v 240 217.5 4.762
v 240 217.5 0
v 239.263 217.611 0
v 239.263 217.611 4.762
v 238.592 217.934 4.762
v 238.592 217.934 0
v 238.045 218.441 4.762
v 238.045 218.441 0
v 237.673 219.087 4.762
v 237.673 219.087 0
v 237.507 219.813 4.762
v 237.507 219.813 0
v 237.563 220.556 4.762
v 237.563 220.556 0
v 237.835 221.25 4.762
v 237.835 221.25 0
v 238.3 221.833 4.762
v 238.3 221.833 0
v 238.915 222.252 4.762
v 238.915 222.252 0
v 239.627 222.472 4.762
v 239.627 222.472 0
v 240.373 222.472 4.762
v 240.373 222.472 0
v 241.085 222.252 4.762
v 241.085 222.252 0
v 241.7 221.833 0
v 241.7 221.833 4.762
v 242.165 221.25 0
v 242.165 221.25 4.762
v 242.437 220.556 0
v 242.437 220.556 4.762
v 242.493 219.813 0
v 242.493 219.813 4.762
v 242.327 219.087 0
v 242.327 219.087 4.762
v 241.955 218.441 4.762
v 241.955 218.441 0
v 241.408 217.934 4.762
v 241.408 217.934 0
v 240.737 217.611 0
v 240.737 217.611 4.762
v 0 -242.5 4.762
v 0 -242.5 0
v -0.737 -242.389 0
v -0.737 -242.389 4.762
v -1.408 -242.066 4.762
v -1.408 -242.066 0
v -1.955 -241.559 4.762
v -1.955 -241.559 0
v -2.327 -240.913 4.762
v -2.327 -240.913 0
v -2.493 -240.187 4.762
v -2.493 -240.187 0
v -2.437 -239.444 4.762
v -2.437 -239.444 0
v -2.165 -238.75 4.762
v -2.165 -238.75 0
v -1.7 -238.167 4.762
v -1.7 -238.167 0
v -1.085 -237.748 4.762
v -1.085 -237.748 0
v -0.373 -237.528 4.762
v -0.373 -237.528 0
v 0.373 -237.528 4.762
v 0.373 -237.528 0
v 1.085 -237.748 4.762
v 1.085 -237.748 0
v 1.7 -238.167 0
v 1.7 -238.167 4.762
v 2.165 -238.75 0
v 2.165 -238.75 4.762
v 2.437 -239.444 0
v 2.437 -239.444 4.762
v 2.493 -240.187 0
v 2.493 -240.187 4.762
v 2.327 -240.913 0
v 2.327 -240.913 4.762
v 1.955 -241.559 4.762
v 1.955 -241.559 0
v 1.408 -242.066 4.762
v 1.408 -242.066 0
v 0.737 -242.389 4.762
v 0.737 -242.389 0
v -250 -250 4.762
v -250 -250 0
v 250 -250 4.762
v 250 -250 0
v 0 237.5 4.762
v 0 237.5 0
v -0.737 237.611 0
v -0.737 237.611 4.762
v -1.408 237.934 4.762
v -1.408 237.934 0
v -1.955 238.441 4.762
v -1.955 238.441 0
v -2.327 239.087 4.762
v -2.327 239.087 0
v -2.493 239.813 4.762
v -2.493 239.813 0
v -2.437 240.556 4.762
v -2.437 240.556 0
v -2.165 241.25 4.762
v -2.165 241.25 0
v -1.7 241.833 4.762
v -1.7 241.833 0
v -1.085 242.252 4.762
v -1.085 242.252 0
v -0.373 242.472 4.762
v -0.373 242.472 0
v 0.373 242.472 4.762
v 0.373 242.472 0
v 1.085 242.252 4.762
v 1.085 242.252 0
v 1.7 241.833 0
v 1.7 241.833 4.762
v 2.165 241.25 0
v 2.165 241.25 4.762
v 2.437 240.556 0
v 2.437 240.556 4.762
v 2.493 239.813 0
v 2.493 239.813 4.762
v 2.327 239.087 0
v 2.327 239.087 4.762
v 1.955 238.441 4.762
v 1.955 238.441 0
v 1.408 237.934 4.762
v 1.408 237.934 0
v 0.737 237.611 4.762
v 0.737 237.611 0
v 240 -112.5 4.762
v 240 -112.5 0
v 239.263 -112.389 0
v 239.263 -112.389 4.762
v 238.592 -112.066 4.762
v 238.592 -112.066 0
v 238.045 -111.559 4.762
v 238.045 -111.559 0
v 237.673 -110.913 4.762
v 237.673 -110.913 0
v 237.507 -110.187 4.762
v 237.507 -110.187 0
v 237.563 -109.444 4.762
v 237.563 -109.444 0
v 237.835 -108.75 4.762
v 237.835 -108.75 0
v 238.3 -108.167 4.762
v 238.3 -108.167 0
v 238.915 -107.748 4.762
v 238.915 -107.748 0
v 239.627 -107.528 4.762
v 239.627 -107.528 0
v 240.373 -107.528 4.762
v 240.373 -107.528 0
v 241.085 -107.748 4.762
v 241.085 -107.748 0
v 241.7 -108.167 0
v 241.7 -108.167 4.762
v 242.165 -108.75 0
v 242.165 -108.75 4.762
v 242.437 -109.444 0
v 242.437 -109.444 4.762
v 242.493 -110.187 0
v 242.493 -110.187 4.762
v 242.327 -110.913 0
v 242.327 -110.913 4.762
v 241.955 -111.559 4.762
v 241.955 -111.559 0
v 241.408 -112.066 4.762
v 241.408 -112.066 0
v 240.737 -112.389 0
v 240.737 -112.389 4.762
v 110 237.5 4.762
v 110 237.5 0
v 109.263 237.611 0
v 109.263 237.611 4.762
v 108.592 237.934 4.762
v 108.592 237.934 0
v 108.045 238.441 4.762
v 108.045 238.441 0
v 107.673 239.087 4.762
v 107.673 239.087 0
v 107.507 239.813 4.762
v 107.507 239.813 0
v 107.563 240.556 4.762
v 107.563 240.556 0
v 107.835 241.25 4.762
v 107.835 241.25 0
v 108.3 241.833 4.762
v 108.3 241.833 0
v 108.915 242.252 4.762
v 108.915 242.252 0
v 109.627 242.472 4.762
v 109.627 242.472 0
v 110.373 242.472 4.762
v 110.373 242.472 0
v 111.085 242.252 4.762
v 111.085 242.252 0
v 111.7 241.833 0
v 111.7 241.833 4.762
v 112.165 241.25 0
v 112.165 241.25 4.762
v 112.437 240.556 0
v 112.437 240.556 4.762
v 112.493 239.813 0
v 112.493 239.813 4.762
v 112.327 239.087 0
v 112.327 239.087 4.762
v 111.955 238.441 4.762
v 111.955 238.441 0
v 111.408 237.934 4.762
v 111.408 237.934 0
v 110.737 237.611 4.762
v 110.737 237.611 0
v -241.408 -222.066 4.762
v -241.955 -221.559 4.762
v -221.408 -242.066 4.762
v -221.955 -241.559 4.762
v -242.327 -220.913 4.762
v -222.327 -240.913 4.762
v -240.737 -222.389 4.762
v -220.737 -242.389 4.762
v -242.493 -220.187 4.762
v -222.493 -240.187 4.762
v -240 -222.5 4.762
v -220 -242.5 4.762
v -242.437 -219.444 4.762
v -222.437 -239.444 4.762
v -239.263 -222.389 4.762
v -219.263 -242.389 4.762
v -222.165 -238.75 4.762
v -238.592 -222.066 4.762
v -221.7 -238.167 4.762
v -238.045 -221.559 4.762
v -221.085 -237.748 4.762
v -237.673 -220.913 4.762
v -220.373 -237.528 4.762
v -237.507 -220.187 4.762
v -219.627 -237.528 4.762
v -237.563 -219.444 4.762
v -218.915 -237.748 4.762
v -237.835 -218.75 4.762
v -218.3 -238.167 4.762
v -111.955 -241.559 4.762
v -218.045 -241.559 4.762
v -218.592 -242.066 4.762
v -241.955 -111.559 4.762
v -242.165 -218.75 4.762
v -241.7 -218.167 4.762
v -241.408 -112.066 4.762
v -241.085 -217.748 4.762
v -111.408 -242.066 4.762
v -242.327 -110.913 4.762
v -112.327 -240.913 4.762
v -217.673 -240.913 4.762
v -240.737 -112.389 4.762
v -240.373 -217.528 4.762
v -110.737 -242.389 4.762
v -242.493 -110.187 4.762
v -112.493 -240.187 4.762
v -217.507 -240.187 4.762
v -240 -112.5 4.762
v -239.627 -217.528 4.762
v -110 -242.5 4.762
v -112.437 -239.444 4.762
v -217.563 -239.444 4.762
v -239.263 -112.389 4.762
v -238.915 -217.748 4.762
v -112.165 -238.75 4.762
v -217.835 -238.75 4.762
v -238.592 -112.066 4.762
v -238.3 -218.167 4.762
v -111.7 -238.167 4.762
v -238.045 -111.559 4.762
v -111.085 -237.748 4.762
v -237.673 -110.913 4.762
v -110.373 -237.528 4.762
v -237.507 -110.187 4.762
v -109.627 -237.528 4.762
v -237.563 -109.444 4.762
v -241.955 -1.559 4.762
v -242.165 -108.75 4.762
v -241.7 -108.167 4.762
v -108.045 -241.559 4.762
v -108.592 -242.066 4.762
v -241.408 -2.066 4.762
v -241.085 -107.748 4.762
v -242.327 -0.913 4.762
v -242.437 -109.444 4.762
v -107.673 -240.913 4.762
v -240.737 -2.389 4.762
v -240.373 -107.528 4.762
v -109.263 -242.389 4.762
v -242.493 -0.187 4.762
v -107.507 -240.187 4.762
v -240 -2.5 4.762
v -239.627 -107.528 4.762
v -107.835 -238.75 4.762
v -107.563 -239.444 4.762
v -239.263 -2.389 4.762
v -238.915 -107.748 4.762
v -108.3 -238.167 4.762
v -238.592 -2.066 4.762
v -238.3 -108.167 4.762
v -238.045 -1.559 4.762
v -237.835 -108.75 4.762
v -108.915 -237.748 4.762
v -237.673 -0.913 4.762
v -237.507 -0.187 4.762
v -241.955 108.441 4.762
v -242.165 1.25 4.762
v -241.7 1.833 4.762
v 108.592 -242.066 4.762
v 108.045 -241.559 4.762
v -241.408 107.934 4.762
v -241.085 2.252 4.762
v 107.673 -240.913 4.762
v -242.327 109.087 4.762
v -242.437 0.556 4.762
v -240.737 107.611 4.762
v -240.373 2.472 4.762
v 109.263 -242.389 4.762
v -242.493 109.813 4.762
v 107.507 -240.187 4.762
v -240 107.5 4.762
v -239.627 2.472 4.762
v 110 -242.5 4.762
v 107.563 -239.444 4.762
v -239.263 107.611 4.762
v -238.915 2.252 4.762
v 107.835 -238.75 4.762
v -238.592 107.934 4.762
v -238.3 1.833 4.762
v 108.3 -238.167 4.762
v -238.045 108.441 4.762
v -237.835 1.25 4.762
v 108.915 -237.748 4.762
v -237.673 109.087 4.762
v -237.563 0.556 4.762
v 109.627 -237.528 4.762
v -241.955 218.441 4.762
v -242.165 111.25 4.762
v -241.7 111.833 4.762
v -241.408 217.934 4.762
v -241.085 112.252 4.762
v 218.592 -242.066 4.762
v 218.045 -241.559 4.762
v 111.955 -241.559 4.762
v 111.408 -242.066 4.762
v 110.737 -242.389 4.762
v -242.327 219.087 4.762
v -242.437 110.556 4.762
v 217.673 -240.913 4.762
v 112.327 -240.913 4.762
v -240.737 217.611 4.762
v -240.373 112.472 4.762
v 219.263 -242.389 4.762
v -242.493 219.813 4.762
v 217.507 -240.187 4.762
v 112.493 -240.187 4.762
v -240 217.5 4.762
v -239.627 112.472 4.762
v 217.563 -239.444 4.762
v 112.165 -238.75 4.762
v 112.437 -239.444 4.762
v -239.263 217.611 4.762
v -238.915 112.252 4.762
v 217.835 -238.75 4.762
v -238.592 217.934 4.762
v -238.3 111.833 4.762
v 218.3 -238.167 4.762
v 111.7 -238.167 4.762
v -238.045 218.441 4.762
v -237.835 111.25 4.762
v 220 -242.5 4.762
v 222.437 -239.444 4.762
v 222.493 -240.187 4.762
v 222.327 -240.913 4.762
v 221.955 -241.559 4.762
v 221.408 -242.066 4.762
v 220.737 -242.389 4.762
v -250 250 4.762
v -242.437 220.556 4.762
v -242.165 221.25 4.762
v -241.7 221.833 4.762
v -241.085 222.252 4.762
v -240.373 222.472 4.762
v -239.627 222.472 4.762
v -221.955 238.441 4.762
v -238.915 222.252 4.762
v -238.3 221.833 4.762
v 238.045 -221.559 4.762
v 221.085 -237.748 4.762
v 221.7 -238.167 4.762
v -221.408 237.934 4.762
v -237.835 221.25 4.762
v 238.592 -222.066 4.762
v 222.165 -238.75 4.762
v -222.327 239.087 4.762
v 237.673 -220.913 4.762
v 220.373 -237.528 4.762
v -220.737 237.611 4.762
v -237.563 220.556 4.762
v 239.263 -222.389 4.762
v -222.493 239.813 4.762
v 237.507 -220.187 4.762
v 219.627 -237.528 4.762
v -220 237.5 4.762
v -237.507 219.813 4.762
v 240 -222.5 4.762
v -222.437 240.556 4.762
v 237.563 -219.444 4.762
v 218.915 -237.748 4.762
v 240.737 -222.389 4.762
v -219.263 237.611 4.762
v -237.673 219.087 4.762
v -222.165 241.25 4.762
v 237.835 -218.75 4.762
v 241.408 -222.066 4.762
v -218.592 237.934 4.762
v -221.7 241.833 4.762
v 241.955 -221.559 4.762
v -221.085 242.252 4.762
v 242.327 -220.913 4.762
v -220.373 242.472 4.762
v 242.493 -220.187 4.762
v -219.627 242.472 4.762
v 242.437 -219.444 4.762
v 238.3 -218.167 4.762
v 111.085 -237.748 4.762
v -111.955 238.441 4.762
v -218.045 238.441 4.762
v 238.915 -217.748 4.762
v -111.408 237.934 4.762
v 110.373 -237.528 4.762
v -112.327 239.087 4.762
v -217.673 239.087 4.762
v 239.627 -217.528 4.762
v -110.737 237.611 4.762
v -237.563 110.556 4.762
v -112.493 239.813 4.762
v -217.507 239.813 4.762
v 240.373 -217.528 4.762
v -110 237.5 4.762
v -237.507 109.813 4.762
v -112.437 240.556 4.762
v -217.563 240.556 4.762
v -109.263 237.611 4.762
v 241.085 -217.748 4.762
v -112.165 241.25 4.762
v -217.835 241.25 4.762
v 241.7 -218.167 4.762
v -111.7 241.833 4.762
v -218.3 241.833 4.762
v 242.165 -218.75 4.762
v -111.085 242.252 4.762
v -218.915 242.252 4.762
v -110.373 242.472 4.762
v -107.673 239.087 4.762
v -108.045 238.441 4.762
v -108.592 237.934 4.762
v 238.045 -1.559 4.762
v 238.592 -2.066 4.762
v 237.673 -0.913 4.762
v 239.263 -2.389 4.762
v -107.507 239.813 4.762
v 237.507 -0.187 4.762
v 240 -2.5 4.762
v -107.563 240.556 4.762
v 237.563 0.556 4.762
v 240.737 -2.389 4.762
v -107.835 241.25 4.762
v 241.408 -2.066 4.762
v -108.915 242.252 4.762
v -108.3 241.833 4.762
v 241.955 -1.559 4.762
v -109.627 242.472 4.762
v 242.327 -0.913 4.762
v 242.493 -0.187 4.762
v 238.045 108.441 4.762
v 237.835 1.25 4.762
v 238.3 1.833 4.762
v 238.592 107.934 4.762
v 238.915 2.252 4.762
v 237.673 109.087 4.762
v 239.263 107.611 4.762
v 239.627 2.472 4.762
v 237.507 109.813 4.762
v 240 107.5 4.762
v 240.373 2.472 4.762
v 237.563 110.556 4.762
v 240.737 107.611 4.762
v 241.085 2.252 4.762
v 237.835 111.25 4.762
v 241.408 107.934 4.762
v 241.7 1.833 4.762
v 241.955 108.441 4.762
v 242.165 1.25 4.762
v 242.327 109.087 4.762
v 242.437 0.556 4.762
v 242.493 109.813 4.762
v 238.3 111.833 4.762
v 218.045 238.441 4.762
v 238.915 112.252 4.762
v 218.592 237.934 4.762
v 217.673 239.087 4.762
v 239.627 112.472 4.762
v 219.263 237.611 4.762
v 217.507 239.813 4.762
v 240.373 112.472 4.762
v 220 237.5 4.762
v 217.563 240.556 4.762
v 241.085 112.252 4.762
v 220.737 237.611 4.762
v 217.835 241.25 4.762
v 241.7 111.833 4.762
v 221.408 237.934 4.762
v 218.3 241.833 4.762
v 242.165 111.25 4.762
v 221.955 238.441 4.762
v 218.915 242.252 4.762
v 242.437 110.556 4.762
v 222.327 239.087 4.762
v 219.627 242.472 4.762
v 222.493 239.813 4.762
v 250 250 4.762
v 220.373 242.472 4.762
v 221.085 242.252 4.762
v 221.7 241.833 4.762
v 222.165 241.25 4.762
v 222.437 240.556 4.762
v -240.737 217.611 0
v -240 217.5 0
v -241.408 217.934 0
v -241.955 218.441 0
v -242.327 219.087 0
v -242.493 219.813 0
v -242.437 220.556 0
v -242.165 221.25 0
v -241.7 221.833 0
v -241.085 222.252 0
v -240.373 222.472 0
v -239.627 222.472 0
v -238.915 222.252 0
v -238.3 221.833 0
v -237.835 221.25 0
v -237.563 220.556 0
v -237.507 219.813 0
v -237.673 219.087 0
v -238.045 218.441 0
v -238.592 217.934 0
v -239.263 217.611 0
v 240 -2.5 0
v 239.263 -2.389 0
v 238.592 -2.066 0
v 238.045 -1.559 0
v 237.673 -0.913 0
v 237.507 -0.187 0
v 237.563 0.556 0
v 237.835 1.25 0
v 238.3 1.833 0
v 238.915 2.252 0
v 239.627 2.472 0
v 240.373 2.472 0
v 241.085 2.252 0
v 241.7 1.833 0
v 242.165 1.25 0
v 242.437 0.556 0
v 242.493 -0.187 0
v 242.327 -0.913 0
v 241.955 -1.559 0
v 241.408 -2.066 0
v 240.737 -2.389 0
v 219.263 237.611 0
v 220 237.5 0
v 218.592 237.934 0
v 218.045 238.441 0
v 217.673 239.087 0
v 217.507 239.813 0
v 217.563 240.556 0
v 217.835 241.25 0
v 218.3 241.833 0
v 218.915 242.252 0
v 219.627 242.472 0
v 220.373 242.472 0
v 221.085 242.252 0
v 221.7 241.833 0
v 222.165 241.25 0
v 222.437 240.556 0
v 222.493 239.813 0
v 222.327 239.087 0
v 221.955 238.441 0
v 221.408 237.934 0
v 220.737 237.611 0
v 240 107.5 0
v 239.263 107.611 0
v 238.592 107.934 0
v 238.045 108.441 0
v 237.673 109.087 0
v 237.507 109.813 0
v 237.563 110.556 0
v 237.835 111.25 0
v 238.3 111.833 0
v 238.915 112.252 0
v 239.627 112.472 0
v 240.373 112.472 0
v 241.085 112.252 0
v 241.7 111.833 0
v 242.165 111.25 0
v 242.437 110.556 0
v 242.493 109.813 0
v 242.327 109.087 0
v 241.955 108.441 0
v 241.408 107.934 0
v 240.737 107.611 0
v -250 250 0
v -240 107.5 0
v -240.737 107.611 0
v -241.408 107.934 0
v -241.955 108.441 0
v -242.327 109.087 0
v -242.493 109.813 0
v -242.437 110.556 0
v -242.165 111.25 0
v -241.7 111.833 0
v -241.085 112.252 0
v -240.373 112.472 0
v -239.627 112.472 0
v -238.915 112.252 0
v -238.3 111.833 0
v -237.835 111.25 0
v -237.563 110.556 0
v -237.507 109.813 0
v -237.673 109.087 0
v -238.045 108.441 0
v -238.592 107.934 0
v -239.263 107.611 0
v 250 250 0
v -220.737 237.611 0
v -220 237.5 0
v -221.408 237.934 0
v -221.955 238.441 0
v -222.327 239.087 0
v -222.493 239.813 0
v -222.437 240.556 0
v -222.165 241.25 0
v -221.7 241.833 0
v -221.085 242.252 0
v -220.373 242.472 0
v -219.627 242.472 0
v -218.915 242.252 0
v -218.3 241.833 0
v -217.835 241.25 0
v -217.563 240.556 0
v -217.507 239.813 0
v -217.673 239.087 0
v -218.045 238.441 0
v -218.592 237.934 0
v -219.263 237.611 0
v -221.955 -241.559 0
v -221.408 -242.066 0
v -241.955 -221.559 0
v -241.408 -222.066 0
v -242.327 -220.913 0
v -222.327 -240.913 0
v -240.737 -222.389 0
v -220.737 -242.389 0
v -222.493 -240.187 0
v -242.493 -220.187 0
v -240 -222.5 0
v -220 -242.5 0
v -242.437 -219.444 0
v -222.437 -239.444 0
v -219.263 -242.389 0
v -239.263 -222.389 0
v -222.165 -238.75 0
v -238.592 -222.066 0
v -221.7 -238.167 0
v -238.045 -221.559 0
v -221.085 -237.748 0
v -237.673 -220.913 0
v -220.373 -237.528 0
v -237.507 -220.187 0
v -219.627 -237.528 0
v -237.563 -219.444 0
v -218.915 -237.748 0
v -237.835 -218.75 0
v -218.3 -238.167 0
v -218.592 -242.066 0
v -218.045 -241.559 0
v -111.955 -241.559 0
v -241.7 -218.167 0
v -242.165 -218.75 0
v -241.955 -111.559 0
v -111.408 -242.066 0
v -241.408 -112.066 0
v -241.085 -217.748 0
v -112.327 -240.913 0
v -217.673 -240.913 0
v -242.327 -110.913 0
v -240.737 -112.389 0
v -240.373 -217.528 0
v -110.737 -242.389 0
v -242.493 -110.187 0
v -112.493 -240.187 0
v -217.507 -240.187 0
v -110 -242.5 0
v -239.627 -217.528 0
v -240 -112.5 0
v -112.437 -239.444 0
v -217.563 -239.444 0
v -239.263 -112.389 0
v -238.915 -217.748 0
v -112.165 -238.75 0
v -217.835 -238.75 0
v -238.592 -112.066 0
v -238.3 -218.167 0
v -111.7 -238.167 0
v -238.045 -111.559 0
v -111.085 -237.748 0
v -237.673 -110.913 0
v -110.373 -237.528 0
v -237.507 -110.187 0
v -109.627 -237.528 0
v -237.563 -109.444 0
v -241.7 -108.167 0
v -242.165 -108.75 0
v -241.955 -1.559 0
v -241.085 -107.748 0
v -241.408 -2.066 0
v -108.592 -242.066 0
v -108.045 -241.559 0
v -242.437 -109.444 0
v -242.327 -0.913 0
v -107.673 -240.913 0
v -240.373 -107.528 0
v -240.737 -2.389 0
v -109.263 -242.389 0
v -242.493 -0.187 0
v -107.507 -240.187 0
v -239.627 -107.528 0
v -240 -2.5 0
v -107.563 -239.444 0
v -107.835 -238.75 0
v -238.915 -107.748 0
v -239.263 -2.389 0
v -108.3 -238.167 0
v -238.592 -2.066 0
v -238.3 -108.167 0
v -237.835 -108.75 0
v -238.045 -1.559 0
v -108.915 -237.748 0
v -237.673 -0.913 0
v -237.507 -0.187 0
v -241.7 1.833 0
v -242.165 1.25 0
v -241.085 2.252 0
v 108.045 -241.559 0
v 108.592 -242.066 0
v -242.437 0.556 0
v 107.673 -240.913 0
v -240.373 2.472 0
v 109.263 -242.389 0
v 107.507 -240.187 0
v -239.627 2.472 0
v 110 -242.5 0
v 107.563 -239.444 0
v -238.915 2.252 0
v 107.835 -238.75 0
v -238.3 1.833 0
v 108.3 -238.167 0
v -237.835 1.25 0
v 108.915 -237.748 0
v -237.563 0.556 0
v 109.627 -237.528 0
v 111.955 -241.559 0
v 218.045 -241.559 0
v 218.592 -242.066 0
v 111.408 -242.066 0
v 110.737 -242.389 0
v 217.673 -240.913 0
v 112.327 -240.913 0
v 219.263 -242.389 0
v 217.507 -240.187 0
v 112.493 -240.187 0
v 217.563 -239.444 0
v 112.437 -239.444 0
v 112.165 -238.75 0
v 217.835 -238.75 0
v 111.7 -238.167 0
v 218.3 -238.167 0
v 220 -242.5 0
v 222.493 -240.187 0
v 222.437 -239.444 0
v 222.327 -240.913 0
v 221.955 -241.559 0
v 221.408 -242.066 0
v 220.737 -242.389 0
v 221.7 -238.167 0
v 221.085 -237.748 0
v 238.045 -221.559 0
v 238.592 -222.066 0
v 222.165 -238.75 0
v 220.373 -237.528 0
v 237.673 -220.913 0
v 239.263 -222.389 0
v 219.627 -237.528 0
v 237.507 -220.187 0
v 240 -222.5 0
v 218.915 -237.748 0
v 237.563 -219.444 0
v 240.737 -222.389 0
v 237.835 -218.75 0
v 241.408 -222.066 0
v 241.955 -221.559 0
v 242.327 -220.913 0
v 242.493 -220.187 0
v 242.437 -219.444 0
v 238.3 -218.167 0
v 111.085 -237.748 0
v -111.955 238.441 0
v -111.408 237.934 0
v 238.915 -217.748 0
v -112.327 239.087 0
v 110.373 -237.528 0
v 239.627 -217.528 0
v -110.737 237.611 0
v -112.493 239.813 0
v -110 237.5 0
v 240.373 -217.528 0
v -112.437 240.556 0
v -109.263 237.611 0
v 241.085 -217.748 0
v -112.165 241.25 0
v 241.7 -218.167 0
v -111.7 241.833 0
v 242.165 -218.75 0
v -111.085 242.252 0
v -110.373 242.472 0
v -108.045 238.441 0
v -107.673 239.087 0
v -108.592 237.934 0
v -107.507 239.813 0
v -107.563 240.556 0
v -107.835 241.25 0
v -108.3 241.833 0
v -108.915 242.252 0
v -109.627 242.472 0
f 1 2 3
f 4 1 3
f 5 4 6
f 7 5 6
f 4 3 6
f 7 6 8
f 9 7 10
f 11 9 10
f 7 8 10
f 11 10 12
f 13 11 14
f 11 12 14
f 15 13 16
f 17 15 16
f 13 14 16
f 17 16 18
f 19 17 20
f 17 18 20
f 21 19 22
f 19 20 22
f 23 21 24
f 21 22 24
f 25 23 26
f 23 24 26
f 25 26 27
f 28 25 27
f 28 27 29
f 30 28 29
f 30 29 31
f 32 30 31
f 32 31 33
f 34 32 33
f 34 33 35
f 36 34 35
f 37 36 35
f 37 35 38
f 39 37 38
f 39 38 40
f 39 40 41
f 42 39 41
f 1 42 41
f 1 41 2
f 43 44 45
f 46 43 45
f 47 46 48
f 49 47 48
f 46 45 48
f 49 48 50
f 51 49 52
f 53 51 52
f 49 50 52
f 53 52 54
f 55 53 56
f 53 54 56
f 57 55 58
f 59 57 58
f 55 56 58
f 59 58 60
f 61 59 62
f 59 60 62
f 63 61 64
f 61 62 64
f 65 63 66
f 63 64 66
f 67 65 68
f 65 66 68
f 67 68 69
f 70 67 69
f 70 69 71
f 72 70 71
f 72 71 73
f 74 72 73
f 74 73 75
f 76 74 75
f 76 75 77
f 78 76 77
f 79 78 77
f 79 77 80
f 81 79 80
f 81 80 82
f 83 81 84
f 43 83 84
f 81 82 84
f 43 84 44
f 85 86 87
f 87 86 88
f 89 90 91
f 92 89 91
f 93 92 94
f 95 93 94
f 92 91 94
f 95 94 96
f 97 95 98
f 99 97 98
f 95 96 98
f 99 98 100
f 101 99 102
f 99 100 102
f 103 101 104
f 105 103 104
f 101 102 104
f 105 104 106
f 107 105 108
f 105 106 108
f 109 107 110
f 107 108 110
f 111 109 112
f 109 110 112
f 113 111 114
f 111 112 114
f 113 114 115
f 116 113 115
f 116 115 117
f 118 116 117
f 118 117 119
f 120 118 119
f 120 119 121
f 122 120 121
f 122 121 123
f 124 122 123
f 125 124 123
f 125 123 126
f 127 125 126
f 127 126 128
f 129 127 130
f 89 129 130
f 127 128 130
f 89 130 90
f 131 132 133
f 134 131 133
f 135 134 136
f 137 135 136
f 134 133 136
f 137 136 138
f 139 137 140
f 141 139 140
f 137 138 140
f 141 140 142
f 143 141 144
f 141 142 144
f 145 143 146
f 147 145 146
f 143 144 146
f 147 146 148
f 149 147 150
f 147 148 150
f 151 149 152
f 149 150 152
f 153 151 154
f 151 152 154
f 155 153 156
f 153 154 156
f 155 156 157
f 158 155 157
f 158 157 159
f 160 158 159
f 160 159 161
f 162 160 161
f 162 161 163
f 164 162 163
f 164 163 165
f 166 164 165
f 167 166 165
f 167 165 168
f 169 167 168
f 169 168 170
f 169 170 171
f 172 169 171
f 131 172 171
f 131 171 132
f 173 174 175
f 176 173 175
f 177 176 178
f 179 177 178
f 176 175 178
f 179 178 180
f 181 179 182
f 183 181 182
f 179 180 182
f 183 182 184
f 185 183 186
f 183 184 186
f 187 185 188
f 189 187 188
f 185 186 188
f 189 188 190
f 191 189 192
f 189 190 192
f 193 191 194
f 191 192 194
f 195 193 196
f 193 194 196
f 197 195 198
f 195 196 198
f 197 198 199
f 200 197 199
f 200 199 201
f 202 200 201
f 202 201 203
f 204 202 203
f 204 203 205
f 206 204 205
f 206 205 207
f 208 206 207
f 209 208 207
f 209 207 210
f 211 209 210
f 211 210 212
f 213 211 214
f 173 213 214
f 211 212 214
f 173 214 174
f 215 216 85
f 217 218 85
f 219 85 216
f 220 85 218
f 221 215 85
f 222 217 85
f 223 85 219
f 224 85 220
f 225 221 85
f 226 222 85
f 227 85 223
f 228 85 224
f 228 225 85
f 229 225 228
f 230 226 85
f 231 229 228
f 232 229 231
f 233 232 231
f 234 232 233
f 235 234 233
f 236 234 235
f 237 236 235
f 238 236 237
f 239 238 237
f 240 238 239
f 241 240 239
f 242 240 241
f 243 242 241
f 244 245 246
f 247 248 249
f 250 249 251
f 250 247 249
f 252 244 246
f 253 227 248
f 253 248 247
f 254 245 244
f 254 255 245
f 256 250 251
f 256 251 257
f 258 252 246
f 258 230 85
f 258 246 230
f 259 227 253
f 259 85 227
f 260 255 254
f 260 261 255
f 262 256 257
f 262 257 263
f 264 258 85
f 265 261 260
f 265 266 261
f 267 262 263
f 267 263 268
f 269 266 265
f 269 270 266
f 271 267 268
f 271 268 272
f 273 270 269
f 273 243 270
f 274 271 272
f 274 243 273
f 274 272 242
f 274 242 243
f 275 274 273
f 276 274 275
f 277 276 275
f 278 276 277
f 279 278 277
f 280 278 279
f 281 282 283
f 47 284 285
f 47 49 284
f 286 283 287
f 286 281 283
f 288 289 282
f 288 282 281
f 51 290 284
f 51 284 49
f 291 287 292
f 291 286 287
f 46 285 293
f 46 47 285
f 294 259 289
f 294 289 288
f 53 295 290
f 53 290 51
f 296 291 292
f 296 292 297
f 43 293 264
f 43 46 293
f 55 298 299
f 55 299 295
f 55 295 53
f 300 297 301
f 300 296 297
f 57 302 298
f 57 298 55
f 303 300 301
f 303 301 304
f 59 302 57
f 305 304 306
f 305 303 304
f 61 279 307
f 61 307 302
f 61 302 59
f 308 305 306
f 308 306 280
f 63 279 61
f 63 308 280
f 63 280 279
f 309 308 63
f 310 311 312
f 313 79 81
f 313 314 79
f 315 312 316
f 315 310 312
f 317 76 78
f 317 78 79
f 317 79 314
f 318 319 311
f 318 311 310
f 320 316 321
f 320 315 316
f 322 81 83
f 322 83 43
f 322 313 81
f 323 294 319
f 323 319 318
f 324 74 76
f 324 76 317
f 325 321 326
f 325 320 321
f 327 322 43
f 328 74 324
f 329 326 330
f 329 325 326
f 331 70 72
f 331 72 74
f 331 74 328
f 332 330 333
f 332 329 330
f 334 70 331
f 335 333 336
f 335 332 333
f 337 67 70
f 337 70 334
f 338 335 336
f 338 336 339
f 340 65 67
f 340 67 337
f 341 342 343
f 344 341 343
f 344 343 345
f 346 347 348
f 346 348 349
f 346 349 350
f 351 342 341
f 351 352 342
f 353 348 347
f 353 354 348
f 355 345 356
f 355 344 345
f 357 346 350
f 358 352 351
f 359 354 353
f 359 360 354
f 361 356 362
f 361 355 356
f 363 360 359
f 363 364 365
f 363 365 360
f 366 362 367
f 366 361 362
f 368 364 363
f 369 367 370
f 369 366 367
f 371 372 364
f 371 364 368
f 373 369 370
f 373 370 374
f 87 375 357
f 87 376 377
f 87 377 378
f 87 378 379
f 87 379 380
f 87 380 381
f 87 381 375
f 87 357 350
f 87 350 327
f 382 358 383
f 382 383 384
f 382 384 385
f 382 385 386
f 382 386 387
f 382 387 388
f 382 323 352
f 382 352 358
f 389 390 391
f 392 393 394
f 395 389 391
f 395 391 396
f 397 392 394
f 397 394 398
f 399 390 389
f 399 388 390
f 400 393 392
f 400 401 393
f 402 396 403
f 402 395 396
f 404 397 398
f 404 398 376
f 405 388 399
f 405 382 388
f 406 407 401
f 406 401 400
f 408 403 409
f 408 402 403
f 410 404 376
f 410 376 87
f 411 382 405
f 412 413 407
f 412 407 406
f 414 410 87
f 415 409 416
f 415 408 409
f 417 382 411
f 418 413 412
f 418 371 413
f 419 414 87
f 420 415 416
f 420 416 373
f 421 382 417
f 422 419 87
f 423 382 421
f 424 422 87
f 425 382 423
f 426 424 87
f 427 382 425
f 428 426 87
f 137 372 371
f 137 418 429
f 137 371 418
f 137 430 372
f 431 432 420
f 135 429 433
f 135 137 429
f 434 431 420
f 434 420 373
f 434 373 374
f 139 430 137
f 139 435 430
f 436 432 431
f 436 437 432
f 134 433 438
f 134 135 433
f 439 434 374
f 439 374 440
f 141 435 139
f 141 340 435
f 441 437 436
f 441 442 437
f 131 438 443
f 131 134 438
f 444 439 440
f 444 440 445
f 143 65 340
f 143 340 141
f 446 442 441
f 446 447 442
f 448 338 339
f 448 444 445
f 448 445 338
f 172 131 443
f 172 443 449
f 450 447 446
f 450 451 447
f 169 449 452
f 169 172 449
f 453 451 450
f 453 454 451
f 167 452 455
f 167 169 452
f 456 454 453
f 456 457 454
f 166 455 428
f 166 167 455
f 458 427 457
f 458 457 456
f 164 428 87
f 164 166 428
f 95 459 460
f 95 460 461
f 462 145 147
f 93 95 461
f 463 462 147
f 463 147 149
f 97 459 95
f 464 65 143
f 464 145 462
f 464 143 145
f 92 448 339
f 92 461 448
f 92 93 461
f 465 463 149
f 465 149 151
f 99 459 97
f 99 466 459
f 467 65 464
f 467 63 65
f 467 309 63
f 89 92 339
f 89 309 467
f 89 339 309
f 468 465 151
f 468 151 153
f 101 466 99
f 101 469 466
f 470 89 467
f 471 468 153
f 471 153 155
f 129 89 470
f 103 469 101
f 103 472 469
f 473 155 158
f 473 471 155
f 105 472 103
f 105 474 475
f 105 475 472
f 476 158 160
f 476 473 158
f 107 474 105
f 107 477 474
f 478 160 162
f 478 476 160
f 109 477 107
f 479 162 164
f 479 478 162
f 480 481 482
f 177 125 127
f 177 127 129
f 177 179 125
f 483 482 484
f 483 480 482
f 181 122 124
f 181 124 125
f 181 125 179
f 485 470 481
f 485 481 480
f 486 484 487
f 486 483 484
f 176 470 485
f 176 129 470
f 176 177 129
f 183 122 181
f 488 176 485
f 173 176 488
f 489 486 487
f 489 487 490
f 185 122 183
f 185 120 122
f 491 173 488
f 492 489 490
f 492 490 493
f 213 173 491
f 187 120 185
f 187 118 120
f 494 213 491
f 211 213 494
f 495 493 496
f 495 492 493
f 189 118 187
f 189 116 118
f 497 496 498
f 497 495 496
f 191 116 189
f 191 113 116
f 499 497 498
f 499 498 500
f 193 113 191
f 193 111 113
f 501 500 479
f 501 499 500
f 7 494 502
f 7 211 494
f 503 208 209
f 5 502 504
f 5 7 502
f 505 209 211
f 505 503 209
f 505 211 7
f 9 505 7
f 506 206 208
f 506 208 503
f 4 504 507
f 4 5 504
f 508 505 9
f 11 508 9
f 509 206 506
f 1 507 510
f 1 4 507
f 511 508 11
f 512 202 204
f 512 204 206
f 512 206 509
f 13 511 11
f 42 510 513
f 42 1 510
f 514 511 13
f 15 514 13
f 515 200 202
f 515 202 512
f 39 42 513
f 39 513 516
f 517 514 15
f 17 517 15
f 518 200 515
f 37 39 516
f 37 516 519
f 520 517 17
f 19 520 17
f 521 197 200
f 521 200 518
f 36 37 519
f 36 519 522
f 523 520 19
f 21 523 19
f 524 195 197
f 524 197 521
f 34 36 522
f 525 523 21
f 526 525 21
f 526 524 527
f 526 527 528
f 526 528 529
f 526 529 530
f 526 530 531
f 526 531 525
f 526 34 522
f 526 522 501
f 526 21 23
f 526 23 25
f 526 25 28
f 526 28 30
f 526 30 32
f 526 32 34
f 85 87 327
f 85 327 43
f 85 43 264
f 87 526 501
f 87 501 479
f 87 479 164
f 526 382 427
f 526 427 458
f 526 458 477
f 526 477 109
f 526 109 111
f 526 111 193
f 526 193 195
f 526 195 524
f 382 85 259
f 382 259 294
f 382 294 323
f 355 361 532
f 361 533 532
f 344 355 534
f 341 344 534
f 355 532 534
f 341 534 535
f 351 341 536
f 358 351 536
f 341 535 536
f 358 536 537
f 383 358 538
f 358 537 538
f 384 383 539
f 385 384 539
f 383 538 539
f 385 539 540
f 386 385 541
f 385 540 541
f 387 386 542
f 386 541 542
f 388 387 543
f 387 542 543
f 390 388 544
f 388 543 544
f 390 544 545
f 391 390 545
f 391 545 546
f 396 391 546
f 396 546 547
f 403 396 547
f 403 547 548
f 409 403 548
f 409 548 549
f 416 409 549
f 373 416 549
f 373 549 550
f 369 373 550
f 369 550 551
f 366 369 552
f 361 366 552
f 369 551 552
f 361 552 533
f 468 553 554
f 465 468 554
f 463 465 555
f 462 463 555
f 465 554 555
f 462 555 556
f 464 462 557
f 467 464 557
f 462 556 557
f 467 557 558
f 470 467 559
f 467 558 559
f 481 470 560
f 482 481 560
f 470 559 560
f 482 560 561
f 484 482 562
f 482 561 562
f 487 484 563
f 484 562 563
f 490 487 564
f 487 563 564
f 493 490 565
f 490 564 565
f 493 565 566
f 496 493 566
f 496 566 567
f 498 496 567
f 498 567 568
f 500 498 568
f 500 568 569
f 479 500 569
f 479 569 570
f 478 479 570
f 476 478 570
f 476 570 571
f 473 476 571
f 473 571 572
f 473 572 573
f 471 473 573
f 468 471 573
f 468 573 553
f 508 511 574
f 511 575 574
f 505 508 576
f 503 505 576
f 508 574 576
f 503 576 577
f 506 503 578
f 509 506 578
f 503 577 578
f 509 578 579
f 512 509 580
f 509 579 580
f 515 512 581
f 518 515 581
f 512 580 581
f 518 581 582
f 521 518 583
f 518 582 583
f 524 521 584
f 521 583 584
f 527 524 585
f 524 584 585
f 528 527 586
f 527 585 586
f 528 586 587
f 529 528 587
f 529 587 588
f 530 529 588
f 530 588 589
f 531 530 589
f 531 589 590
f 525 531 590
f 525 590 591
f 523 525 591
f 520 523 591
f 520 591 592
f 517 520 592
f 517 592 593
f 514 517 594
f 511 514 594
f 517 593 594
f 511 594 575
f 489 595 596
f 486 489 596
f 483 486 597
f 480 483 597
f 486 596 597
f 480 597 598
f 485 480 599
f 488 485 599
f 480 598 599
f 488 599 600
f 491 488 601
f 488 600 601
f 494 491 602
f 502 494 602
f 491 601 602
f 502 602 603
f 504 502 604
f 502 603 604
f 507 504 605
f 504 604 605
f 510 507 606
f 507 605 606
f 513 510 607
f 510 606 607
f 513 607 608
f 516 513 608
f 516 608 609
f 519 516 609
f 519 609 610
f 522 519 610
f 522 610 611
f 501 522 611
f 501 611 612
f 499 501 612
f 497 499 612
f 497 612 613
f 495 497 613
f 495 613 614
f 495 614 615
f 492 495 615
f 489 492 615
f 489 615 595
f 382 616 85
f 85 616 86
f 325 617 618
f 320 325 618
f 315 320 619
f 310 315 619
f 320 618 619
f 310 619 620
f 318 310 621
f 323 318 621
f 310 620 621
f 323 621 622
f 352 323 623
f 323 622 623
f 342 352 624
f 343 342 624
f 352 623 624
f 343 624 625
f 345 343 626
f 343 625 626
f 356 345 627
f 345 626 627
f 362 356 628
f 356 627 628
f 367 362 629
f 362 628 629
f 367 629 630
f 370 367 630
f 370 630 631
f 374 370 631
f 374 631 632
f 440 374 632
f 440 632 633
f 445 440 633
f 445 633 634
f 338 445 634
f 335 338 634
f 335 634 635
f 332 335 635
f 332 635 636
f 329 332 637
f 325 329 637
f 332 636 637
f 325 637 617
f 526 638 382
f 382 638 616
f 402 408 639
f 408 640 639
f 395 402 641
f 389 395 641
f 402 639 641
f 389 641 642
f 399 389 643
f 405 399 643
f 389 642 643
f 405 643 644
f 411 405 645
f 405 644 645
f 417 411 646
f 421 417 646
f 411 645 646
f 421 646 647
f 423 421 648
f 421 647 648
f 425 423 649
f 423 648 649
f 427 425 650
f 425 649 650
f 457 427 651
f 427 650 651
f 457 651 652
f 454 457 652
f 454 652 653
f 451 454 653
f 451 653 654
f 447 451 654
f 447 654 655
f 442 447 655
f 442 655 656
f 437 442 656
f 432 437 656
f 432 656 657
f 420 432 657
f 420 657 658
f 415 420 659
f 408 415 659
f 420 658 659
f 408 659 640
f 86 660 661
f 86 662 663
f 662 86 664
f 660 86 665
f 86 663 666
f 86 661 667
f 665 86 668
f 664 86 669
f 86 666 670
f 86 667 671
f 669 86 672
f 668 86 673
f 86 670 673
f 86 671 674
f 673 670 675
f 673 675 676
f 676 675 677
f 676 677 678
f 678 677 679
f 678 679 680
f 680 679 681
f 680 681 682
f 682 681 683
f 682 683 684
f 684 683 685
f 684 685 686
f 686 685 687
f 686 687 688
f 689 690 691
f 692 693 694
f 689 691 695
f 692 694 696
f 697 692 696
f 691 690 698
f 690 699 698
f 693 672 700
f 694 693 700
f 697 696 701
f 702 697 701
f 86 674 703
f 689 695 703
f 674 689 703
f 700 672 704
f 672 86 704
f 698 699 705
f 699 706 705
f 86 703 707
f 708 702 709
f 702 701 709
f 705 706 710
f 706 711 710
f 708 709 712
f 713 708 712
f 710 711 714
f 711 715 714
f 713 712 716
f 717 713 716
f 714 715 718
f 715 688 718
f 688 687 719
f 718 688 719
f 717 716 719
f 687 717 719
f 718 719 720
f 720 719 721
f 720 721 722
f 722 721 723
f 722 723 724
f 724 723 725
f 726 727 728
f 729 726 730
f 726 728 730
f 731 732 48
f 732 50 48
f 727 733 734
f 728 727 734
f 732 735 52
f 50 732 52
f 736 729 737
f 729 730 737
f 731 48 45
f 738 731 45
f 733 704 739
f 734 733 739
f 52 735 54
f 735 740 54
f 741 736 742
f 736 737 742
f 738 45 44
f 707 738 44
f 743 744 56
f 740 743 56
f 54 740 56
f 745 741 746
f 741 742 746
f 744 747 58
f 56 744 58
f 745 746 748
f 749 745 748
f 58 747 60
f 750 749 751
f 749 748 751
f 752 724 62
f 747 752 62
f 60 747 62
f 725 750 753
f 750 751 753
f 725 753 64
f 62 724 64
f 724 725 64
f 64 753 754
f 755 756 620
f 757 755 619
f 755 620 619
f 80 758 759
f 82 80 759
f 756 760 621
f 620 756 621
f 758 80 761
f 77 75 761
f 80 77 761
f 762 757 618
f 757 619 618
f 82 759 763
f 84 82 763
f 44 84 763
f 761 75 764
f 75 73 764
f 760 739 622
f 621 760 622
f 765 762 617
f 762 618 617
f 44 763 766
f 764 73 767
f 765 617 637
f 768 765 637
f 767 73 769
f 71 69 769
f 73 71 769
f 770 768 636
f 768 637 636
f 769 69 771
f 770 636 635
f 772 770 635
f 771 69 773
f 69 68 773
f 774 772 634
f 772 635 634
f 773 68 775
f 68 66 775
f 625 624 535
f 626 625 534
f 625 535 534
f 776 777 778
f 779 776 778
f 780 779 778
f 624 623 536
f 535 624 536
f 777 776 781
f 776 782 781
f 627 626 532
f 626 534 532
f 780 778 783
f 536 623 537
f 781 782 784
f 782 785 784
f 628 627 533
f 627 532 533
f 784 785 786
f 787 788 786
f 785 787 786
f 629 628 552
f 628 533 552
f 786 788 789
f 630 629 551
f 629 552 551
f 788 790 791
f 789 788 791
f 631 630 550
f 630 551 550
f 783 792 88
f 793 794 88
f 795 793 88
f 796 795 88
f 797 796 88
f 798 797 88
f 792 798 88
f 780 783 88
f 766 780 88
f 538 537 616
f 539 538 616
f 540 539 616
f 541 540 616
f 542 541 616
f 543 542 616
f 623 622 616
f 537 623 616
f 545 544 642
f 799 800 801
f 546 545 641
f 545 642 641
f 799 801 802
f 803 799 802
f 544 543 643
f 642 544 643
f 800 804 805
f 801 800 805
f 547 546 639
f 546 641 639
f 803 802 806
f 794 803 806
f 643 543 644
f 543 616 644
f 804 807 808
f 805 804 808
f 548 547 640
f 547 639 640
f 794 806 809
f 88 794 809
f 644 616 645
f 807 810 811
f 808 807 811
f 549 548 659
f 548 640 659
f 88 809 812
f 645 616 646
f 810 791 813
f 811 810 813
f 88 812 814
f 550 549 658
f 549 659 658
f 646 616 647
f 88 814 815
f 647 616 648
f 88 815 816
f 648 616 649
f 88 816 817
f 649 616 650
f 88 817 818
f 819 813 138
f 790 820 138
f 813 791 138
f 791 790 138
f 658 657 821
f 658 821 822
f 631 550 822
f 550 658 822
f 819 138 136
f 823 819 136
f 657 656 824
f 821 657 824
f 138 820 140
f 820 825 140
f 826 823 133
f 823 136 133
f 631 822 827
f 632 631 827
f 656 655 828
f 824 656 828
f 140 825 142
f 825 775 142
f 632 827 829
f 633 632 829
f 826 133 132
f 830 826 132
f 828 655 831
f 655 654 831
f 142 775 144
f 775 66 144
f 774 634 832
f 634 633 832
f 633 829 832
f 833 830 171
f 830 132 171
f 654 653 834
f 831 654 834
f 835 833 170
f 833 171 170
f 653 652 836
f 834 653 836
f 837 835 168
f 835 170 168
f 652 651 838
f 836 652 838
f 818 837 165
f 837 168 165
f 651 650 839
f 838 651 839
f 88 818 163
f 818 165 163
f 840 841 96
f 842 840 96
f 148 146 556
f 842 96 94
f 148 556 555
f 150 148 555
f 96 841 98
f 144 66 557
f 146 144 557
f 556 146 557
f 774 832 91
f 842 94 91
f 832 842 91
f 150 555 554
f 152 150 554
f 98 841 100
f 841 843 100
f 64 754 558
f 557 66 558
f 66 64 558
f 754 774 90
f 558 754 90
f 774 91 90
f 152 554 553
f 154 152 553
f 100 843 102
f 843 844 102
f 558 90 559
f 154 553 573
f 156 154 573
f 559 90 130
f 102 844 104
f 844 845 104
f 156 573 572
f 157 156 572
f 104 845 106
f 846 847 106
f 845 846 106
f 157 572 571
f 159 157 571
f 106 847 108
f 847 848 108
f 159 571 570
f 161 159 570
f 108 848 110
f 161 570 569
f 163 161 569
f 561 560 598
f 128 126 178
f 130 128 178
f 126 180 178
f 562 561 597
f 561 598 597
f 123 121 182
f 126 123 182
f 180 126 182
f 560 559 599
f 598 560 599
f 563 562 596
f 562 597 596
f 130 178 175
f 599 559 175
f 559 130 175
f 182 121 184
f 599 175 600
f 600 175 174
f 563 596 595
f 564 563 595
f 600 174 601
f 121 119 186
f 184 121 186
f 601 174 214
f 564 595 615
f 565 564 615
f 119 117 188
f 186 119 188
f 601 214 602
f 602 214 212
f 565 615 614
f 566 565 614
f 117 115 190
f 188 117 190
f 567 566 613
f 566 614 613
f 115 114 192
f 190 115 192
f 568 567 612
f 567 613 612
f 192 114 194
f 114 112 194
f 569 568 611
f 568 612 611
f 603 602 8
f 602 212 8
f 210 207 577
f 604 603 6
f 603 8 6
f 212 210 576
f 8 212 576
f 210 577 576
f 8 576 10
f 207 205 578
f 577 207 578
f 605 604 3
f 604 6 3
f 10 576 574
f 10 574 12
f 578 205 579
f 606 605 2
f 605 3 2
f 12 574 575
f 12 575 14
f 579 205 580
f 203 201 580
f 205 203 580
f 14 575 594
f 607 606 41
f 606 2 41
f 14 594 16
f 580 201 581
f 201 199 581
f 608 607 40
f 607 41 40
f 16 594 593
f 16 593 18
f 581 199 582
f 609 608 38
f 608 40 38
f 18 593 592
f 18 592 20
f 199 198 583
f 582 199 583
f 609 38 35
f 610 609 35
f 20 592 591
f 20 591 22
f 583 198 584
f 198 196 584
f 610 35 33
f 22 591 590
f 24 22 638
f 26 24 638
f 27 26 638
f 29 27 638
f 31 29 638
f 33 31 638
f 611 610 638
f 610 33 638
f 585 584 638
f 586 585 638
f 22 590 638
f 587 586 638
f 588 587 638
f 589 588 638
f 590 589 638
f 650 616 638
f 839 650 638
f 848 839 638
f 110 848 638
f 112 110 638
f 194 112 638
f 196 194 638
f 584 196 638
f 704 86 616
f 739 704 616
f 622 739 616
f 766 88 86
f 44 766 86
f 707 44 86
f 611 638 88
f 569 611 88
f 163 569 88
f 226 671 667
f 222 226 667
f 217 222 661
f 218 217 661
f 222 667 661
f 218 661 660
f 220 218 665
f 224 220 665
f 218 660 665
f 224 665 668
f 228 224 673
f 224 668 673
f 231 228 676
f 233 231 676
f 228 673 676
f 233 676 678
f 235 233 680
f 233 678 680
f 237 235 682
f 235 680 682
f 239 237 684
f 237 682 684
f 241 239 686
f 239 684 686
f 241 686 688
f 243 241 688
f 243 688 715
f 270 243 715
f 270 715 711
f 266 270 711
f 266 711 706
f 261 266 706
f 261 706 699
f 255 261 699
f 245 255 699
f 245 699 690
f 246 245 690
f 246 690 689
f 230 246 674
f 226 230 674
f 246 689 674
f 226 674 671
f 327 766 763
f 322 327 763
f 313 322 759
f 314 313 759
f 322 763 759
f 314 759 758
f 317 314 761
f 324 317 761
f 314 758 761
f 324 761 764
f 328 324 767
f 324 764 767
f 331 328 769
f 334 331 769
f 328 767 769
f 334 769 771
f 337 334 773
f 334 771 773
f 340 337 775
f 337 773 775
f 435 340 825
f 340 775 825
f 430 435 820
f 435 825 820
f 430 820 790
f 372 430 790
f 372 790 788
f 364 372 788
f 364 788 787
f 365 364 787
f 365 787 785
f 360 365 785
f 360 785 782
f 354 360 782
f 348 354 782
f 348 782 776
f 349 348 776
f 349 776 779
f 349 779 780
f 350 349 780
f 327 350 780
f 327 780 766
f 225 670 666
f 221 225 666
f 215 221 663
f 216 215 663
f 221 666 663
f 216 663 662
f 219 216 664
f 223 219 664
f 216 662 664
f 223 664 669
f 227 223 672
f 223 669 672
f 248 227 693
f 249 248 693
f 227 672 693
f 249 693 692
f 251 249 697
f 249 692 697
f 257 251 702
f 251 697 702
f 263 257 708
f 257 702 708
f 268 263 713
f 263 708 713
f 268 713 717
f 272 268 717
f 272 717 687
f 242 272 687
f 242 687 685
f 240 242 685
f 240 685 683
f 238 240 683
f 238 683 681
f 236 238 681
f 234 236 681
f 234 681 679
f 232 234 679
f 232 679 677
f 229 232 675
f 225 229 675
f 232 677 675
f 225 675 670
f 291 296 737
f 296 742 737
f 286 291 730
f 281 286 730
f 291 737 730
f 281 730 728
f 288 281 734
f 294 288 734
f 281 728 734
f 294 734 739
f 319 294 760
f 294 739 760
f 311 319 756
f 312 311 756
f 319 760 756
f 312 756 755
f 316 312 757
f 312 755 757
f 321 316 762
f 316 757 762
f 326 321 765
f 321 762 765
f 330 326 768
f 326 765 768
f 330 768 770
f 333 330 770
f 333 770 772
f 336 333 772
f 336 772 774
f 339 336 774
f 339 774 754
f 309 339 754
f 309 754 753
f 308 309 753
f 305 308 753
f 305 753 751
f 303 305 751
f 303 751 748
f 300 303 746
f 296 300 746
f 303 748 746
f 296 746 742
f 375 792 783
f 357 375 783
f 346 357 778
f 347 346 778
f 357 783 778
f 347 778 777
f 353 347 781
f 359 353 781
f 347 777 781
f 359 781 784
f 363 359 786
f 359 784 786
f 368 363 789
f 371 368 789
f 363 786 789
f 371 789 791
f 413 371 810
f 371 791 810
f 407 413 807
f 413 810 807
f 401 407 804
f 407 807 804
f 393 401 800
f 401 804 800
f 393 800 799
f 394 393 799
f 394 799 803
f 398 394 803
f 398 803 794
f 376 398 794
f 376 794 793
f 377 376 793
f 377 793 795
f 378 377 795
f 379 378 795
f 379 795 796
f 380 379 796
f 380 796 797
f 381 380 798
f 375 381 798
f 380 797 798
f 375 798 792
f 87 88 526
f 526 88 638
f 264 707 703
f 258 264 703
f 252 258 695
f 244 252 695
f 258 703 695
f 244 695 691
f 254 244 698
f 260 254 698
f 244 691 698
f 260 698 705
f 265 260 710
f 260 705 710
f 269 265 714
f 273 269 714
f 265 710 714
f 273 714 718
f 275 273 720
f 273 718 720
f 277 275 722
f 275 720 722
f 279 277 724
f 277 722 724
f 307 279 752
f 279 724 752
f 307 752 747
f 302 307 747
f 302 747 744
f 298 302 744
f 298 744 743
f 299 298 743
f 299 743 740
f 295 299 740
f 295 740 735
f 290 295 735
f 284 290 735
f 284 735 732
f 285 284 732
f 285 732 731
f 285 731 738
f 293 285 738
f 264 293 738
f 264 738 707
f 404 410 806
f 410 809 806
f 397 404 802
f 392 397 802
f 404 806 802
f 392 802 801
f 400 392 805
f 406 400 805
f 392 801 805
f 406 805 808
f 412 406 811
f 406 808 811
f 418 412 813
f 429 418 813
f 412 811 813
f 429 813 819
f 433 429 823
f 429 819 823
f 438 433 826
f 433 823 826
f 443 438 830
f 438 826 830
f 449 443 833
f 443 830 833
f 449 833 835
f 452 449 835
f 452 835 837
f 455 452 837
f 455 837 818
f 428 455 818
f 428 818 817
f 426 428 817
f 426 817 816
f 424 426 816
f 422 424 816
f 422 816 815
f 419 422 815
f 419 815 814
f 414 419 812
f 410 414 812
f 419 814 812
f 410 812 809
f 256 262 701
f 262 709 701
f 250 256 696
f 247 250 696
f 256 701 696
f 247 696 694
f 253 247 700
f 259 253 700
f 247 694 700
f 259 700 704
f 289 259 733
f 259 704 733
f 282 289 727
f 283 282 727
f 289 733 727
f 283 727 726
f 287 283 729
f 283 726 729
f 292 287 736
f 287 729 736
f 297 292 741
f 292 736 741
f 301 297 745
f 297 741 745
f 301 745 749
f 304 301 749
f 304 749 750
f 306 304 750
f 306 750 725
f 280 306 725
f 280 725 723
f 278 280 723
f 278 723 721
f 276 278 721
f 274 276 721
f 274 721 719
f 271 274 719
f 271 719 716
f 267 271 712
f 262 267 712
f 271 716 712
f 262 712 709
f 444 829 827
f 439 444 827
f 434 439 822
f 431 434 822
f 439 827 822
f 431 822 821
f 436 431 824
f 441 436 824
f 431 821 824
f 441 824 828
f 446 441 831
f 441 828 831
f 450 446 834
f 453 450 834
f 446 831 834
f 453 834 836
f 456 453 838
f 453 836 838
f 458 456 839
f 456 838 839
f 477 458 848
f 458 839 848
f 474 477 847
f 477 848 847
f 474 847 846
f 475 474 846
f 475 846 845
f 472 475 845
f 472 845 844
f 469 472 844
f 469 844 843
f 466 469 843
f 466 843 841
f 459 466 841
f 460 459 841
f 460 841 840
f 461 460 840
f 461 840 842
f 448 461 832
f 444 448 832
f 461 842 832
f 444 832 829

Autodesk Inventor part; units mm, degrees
ref_plane "YZ Plane" through (0, 0, 0) normal (1, 0, 0) x (0, 1, 0)
ref_plane "XZ Plane" through (0, 0, 0) normal (0, 1, 0) x (-1, 0, 0)
ref_plane "XY Plane" through (0, 0, 0) normal (0, 0, 1) x (1, 0, 0)
sketch "Sketch1" plane through (0, 0, 0) normal (0, 0, 1) x (1, 0, 0)
  line L0 (-250, -250) -> (250, -250)
  line L1 (250, -250) -> (250, 250)
  line L2 (250, 250) -> (-250, 250)
  line L3 (-250, 250) -> (-250, -250)
  line L4 (-250, -250) -> (250, 250) construction
  line L5 (250, -250) -> (-250, 250) construction
  point P0 (0, 0)
  dimension "d0" = 500
  dimension "d1" = 500
extrude "Extrusion1" add sketch "Sketch1" along normal blind 4.7625
sketch "Sketch2" plane through (0, 0, 4.7625) normal (0, 0, 1) x (1, 0, 0)
  line L0 (-250, -250) -> (250, -250) projected
  line L1 (250, -250) -> (250, 250) projected
  line L2 (250, 250) -> (-250, 250) projected
  line L3 (-250, 250) -> (-250, -250) projected
  point P0 (0, 0)
  point P1 (-220, 240)
  dimension "d4" = 10
  dimension "d5" = 30
hole "Hole1" at (-220, 240, 4.7625) direction (0, 0, -1) diameter 5 end through all
pattern_linear "Rectangular Pattern1" count 5 spacing 110 along (1, 0, 0) count 2 spacing 480 along (0, -1, 0) of "Hole1"
sketch "Sketch3" plane through (0, 0, 4.7625) normal (0, 0, 1) x (1, 0, 0)
  circle A0 centre (220, -240) radius 2.5 projected
  circle A1 centre (110, -240) radius 2.5 projected
  circle A2 centre (0, -240) radius 2.5 projected
  circle A3 centre (-110, -240) radius 2.5 projected
  circle A4 centre (-220, -240) radius 2.5 projected
  circle A5 centre (220, 240) radius 2.5 projected
  circle A6 centre (110, 240) radius 2.5 projected
  circle A7 centre (0, 240) radius 2.5 projected
  circle A8 centre (-110, 240) radius 2.5 projected
  circle A9 centre (-220, 240) radius 2.5 projected
  line L0 (-250, -250) -> (250, -250) projected
  line L1 (250, -250) -> (250, 250) projected
  line L2 (250, 250) -> (-250, 250) projected
  line L3 (-250, 250) -> (-250, -250) projected
  point P0 (0, 0)
  point P1 (-240, 220)
  dimension "d19" = 10
  dimension "d20" = 30
hole "Hole2" at (-240, 220, 4.7625) direction (0, 0, -1) diameter 5 end through all
pattern_linear "Rectangular Pattern2" count 5 spacing 110 along (0, -1, 0) count 2 spacing 480 along (1, 0, 0) of "Hole2"
properties part number "Face B" material "Nylon 6/6"
